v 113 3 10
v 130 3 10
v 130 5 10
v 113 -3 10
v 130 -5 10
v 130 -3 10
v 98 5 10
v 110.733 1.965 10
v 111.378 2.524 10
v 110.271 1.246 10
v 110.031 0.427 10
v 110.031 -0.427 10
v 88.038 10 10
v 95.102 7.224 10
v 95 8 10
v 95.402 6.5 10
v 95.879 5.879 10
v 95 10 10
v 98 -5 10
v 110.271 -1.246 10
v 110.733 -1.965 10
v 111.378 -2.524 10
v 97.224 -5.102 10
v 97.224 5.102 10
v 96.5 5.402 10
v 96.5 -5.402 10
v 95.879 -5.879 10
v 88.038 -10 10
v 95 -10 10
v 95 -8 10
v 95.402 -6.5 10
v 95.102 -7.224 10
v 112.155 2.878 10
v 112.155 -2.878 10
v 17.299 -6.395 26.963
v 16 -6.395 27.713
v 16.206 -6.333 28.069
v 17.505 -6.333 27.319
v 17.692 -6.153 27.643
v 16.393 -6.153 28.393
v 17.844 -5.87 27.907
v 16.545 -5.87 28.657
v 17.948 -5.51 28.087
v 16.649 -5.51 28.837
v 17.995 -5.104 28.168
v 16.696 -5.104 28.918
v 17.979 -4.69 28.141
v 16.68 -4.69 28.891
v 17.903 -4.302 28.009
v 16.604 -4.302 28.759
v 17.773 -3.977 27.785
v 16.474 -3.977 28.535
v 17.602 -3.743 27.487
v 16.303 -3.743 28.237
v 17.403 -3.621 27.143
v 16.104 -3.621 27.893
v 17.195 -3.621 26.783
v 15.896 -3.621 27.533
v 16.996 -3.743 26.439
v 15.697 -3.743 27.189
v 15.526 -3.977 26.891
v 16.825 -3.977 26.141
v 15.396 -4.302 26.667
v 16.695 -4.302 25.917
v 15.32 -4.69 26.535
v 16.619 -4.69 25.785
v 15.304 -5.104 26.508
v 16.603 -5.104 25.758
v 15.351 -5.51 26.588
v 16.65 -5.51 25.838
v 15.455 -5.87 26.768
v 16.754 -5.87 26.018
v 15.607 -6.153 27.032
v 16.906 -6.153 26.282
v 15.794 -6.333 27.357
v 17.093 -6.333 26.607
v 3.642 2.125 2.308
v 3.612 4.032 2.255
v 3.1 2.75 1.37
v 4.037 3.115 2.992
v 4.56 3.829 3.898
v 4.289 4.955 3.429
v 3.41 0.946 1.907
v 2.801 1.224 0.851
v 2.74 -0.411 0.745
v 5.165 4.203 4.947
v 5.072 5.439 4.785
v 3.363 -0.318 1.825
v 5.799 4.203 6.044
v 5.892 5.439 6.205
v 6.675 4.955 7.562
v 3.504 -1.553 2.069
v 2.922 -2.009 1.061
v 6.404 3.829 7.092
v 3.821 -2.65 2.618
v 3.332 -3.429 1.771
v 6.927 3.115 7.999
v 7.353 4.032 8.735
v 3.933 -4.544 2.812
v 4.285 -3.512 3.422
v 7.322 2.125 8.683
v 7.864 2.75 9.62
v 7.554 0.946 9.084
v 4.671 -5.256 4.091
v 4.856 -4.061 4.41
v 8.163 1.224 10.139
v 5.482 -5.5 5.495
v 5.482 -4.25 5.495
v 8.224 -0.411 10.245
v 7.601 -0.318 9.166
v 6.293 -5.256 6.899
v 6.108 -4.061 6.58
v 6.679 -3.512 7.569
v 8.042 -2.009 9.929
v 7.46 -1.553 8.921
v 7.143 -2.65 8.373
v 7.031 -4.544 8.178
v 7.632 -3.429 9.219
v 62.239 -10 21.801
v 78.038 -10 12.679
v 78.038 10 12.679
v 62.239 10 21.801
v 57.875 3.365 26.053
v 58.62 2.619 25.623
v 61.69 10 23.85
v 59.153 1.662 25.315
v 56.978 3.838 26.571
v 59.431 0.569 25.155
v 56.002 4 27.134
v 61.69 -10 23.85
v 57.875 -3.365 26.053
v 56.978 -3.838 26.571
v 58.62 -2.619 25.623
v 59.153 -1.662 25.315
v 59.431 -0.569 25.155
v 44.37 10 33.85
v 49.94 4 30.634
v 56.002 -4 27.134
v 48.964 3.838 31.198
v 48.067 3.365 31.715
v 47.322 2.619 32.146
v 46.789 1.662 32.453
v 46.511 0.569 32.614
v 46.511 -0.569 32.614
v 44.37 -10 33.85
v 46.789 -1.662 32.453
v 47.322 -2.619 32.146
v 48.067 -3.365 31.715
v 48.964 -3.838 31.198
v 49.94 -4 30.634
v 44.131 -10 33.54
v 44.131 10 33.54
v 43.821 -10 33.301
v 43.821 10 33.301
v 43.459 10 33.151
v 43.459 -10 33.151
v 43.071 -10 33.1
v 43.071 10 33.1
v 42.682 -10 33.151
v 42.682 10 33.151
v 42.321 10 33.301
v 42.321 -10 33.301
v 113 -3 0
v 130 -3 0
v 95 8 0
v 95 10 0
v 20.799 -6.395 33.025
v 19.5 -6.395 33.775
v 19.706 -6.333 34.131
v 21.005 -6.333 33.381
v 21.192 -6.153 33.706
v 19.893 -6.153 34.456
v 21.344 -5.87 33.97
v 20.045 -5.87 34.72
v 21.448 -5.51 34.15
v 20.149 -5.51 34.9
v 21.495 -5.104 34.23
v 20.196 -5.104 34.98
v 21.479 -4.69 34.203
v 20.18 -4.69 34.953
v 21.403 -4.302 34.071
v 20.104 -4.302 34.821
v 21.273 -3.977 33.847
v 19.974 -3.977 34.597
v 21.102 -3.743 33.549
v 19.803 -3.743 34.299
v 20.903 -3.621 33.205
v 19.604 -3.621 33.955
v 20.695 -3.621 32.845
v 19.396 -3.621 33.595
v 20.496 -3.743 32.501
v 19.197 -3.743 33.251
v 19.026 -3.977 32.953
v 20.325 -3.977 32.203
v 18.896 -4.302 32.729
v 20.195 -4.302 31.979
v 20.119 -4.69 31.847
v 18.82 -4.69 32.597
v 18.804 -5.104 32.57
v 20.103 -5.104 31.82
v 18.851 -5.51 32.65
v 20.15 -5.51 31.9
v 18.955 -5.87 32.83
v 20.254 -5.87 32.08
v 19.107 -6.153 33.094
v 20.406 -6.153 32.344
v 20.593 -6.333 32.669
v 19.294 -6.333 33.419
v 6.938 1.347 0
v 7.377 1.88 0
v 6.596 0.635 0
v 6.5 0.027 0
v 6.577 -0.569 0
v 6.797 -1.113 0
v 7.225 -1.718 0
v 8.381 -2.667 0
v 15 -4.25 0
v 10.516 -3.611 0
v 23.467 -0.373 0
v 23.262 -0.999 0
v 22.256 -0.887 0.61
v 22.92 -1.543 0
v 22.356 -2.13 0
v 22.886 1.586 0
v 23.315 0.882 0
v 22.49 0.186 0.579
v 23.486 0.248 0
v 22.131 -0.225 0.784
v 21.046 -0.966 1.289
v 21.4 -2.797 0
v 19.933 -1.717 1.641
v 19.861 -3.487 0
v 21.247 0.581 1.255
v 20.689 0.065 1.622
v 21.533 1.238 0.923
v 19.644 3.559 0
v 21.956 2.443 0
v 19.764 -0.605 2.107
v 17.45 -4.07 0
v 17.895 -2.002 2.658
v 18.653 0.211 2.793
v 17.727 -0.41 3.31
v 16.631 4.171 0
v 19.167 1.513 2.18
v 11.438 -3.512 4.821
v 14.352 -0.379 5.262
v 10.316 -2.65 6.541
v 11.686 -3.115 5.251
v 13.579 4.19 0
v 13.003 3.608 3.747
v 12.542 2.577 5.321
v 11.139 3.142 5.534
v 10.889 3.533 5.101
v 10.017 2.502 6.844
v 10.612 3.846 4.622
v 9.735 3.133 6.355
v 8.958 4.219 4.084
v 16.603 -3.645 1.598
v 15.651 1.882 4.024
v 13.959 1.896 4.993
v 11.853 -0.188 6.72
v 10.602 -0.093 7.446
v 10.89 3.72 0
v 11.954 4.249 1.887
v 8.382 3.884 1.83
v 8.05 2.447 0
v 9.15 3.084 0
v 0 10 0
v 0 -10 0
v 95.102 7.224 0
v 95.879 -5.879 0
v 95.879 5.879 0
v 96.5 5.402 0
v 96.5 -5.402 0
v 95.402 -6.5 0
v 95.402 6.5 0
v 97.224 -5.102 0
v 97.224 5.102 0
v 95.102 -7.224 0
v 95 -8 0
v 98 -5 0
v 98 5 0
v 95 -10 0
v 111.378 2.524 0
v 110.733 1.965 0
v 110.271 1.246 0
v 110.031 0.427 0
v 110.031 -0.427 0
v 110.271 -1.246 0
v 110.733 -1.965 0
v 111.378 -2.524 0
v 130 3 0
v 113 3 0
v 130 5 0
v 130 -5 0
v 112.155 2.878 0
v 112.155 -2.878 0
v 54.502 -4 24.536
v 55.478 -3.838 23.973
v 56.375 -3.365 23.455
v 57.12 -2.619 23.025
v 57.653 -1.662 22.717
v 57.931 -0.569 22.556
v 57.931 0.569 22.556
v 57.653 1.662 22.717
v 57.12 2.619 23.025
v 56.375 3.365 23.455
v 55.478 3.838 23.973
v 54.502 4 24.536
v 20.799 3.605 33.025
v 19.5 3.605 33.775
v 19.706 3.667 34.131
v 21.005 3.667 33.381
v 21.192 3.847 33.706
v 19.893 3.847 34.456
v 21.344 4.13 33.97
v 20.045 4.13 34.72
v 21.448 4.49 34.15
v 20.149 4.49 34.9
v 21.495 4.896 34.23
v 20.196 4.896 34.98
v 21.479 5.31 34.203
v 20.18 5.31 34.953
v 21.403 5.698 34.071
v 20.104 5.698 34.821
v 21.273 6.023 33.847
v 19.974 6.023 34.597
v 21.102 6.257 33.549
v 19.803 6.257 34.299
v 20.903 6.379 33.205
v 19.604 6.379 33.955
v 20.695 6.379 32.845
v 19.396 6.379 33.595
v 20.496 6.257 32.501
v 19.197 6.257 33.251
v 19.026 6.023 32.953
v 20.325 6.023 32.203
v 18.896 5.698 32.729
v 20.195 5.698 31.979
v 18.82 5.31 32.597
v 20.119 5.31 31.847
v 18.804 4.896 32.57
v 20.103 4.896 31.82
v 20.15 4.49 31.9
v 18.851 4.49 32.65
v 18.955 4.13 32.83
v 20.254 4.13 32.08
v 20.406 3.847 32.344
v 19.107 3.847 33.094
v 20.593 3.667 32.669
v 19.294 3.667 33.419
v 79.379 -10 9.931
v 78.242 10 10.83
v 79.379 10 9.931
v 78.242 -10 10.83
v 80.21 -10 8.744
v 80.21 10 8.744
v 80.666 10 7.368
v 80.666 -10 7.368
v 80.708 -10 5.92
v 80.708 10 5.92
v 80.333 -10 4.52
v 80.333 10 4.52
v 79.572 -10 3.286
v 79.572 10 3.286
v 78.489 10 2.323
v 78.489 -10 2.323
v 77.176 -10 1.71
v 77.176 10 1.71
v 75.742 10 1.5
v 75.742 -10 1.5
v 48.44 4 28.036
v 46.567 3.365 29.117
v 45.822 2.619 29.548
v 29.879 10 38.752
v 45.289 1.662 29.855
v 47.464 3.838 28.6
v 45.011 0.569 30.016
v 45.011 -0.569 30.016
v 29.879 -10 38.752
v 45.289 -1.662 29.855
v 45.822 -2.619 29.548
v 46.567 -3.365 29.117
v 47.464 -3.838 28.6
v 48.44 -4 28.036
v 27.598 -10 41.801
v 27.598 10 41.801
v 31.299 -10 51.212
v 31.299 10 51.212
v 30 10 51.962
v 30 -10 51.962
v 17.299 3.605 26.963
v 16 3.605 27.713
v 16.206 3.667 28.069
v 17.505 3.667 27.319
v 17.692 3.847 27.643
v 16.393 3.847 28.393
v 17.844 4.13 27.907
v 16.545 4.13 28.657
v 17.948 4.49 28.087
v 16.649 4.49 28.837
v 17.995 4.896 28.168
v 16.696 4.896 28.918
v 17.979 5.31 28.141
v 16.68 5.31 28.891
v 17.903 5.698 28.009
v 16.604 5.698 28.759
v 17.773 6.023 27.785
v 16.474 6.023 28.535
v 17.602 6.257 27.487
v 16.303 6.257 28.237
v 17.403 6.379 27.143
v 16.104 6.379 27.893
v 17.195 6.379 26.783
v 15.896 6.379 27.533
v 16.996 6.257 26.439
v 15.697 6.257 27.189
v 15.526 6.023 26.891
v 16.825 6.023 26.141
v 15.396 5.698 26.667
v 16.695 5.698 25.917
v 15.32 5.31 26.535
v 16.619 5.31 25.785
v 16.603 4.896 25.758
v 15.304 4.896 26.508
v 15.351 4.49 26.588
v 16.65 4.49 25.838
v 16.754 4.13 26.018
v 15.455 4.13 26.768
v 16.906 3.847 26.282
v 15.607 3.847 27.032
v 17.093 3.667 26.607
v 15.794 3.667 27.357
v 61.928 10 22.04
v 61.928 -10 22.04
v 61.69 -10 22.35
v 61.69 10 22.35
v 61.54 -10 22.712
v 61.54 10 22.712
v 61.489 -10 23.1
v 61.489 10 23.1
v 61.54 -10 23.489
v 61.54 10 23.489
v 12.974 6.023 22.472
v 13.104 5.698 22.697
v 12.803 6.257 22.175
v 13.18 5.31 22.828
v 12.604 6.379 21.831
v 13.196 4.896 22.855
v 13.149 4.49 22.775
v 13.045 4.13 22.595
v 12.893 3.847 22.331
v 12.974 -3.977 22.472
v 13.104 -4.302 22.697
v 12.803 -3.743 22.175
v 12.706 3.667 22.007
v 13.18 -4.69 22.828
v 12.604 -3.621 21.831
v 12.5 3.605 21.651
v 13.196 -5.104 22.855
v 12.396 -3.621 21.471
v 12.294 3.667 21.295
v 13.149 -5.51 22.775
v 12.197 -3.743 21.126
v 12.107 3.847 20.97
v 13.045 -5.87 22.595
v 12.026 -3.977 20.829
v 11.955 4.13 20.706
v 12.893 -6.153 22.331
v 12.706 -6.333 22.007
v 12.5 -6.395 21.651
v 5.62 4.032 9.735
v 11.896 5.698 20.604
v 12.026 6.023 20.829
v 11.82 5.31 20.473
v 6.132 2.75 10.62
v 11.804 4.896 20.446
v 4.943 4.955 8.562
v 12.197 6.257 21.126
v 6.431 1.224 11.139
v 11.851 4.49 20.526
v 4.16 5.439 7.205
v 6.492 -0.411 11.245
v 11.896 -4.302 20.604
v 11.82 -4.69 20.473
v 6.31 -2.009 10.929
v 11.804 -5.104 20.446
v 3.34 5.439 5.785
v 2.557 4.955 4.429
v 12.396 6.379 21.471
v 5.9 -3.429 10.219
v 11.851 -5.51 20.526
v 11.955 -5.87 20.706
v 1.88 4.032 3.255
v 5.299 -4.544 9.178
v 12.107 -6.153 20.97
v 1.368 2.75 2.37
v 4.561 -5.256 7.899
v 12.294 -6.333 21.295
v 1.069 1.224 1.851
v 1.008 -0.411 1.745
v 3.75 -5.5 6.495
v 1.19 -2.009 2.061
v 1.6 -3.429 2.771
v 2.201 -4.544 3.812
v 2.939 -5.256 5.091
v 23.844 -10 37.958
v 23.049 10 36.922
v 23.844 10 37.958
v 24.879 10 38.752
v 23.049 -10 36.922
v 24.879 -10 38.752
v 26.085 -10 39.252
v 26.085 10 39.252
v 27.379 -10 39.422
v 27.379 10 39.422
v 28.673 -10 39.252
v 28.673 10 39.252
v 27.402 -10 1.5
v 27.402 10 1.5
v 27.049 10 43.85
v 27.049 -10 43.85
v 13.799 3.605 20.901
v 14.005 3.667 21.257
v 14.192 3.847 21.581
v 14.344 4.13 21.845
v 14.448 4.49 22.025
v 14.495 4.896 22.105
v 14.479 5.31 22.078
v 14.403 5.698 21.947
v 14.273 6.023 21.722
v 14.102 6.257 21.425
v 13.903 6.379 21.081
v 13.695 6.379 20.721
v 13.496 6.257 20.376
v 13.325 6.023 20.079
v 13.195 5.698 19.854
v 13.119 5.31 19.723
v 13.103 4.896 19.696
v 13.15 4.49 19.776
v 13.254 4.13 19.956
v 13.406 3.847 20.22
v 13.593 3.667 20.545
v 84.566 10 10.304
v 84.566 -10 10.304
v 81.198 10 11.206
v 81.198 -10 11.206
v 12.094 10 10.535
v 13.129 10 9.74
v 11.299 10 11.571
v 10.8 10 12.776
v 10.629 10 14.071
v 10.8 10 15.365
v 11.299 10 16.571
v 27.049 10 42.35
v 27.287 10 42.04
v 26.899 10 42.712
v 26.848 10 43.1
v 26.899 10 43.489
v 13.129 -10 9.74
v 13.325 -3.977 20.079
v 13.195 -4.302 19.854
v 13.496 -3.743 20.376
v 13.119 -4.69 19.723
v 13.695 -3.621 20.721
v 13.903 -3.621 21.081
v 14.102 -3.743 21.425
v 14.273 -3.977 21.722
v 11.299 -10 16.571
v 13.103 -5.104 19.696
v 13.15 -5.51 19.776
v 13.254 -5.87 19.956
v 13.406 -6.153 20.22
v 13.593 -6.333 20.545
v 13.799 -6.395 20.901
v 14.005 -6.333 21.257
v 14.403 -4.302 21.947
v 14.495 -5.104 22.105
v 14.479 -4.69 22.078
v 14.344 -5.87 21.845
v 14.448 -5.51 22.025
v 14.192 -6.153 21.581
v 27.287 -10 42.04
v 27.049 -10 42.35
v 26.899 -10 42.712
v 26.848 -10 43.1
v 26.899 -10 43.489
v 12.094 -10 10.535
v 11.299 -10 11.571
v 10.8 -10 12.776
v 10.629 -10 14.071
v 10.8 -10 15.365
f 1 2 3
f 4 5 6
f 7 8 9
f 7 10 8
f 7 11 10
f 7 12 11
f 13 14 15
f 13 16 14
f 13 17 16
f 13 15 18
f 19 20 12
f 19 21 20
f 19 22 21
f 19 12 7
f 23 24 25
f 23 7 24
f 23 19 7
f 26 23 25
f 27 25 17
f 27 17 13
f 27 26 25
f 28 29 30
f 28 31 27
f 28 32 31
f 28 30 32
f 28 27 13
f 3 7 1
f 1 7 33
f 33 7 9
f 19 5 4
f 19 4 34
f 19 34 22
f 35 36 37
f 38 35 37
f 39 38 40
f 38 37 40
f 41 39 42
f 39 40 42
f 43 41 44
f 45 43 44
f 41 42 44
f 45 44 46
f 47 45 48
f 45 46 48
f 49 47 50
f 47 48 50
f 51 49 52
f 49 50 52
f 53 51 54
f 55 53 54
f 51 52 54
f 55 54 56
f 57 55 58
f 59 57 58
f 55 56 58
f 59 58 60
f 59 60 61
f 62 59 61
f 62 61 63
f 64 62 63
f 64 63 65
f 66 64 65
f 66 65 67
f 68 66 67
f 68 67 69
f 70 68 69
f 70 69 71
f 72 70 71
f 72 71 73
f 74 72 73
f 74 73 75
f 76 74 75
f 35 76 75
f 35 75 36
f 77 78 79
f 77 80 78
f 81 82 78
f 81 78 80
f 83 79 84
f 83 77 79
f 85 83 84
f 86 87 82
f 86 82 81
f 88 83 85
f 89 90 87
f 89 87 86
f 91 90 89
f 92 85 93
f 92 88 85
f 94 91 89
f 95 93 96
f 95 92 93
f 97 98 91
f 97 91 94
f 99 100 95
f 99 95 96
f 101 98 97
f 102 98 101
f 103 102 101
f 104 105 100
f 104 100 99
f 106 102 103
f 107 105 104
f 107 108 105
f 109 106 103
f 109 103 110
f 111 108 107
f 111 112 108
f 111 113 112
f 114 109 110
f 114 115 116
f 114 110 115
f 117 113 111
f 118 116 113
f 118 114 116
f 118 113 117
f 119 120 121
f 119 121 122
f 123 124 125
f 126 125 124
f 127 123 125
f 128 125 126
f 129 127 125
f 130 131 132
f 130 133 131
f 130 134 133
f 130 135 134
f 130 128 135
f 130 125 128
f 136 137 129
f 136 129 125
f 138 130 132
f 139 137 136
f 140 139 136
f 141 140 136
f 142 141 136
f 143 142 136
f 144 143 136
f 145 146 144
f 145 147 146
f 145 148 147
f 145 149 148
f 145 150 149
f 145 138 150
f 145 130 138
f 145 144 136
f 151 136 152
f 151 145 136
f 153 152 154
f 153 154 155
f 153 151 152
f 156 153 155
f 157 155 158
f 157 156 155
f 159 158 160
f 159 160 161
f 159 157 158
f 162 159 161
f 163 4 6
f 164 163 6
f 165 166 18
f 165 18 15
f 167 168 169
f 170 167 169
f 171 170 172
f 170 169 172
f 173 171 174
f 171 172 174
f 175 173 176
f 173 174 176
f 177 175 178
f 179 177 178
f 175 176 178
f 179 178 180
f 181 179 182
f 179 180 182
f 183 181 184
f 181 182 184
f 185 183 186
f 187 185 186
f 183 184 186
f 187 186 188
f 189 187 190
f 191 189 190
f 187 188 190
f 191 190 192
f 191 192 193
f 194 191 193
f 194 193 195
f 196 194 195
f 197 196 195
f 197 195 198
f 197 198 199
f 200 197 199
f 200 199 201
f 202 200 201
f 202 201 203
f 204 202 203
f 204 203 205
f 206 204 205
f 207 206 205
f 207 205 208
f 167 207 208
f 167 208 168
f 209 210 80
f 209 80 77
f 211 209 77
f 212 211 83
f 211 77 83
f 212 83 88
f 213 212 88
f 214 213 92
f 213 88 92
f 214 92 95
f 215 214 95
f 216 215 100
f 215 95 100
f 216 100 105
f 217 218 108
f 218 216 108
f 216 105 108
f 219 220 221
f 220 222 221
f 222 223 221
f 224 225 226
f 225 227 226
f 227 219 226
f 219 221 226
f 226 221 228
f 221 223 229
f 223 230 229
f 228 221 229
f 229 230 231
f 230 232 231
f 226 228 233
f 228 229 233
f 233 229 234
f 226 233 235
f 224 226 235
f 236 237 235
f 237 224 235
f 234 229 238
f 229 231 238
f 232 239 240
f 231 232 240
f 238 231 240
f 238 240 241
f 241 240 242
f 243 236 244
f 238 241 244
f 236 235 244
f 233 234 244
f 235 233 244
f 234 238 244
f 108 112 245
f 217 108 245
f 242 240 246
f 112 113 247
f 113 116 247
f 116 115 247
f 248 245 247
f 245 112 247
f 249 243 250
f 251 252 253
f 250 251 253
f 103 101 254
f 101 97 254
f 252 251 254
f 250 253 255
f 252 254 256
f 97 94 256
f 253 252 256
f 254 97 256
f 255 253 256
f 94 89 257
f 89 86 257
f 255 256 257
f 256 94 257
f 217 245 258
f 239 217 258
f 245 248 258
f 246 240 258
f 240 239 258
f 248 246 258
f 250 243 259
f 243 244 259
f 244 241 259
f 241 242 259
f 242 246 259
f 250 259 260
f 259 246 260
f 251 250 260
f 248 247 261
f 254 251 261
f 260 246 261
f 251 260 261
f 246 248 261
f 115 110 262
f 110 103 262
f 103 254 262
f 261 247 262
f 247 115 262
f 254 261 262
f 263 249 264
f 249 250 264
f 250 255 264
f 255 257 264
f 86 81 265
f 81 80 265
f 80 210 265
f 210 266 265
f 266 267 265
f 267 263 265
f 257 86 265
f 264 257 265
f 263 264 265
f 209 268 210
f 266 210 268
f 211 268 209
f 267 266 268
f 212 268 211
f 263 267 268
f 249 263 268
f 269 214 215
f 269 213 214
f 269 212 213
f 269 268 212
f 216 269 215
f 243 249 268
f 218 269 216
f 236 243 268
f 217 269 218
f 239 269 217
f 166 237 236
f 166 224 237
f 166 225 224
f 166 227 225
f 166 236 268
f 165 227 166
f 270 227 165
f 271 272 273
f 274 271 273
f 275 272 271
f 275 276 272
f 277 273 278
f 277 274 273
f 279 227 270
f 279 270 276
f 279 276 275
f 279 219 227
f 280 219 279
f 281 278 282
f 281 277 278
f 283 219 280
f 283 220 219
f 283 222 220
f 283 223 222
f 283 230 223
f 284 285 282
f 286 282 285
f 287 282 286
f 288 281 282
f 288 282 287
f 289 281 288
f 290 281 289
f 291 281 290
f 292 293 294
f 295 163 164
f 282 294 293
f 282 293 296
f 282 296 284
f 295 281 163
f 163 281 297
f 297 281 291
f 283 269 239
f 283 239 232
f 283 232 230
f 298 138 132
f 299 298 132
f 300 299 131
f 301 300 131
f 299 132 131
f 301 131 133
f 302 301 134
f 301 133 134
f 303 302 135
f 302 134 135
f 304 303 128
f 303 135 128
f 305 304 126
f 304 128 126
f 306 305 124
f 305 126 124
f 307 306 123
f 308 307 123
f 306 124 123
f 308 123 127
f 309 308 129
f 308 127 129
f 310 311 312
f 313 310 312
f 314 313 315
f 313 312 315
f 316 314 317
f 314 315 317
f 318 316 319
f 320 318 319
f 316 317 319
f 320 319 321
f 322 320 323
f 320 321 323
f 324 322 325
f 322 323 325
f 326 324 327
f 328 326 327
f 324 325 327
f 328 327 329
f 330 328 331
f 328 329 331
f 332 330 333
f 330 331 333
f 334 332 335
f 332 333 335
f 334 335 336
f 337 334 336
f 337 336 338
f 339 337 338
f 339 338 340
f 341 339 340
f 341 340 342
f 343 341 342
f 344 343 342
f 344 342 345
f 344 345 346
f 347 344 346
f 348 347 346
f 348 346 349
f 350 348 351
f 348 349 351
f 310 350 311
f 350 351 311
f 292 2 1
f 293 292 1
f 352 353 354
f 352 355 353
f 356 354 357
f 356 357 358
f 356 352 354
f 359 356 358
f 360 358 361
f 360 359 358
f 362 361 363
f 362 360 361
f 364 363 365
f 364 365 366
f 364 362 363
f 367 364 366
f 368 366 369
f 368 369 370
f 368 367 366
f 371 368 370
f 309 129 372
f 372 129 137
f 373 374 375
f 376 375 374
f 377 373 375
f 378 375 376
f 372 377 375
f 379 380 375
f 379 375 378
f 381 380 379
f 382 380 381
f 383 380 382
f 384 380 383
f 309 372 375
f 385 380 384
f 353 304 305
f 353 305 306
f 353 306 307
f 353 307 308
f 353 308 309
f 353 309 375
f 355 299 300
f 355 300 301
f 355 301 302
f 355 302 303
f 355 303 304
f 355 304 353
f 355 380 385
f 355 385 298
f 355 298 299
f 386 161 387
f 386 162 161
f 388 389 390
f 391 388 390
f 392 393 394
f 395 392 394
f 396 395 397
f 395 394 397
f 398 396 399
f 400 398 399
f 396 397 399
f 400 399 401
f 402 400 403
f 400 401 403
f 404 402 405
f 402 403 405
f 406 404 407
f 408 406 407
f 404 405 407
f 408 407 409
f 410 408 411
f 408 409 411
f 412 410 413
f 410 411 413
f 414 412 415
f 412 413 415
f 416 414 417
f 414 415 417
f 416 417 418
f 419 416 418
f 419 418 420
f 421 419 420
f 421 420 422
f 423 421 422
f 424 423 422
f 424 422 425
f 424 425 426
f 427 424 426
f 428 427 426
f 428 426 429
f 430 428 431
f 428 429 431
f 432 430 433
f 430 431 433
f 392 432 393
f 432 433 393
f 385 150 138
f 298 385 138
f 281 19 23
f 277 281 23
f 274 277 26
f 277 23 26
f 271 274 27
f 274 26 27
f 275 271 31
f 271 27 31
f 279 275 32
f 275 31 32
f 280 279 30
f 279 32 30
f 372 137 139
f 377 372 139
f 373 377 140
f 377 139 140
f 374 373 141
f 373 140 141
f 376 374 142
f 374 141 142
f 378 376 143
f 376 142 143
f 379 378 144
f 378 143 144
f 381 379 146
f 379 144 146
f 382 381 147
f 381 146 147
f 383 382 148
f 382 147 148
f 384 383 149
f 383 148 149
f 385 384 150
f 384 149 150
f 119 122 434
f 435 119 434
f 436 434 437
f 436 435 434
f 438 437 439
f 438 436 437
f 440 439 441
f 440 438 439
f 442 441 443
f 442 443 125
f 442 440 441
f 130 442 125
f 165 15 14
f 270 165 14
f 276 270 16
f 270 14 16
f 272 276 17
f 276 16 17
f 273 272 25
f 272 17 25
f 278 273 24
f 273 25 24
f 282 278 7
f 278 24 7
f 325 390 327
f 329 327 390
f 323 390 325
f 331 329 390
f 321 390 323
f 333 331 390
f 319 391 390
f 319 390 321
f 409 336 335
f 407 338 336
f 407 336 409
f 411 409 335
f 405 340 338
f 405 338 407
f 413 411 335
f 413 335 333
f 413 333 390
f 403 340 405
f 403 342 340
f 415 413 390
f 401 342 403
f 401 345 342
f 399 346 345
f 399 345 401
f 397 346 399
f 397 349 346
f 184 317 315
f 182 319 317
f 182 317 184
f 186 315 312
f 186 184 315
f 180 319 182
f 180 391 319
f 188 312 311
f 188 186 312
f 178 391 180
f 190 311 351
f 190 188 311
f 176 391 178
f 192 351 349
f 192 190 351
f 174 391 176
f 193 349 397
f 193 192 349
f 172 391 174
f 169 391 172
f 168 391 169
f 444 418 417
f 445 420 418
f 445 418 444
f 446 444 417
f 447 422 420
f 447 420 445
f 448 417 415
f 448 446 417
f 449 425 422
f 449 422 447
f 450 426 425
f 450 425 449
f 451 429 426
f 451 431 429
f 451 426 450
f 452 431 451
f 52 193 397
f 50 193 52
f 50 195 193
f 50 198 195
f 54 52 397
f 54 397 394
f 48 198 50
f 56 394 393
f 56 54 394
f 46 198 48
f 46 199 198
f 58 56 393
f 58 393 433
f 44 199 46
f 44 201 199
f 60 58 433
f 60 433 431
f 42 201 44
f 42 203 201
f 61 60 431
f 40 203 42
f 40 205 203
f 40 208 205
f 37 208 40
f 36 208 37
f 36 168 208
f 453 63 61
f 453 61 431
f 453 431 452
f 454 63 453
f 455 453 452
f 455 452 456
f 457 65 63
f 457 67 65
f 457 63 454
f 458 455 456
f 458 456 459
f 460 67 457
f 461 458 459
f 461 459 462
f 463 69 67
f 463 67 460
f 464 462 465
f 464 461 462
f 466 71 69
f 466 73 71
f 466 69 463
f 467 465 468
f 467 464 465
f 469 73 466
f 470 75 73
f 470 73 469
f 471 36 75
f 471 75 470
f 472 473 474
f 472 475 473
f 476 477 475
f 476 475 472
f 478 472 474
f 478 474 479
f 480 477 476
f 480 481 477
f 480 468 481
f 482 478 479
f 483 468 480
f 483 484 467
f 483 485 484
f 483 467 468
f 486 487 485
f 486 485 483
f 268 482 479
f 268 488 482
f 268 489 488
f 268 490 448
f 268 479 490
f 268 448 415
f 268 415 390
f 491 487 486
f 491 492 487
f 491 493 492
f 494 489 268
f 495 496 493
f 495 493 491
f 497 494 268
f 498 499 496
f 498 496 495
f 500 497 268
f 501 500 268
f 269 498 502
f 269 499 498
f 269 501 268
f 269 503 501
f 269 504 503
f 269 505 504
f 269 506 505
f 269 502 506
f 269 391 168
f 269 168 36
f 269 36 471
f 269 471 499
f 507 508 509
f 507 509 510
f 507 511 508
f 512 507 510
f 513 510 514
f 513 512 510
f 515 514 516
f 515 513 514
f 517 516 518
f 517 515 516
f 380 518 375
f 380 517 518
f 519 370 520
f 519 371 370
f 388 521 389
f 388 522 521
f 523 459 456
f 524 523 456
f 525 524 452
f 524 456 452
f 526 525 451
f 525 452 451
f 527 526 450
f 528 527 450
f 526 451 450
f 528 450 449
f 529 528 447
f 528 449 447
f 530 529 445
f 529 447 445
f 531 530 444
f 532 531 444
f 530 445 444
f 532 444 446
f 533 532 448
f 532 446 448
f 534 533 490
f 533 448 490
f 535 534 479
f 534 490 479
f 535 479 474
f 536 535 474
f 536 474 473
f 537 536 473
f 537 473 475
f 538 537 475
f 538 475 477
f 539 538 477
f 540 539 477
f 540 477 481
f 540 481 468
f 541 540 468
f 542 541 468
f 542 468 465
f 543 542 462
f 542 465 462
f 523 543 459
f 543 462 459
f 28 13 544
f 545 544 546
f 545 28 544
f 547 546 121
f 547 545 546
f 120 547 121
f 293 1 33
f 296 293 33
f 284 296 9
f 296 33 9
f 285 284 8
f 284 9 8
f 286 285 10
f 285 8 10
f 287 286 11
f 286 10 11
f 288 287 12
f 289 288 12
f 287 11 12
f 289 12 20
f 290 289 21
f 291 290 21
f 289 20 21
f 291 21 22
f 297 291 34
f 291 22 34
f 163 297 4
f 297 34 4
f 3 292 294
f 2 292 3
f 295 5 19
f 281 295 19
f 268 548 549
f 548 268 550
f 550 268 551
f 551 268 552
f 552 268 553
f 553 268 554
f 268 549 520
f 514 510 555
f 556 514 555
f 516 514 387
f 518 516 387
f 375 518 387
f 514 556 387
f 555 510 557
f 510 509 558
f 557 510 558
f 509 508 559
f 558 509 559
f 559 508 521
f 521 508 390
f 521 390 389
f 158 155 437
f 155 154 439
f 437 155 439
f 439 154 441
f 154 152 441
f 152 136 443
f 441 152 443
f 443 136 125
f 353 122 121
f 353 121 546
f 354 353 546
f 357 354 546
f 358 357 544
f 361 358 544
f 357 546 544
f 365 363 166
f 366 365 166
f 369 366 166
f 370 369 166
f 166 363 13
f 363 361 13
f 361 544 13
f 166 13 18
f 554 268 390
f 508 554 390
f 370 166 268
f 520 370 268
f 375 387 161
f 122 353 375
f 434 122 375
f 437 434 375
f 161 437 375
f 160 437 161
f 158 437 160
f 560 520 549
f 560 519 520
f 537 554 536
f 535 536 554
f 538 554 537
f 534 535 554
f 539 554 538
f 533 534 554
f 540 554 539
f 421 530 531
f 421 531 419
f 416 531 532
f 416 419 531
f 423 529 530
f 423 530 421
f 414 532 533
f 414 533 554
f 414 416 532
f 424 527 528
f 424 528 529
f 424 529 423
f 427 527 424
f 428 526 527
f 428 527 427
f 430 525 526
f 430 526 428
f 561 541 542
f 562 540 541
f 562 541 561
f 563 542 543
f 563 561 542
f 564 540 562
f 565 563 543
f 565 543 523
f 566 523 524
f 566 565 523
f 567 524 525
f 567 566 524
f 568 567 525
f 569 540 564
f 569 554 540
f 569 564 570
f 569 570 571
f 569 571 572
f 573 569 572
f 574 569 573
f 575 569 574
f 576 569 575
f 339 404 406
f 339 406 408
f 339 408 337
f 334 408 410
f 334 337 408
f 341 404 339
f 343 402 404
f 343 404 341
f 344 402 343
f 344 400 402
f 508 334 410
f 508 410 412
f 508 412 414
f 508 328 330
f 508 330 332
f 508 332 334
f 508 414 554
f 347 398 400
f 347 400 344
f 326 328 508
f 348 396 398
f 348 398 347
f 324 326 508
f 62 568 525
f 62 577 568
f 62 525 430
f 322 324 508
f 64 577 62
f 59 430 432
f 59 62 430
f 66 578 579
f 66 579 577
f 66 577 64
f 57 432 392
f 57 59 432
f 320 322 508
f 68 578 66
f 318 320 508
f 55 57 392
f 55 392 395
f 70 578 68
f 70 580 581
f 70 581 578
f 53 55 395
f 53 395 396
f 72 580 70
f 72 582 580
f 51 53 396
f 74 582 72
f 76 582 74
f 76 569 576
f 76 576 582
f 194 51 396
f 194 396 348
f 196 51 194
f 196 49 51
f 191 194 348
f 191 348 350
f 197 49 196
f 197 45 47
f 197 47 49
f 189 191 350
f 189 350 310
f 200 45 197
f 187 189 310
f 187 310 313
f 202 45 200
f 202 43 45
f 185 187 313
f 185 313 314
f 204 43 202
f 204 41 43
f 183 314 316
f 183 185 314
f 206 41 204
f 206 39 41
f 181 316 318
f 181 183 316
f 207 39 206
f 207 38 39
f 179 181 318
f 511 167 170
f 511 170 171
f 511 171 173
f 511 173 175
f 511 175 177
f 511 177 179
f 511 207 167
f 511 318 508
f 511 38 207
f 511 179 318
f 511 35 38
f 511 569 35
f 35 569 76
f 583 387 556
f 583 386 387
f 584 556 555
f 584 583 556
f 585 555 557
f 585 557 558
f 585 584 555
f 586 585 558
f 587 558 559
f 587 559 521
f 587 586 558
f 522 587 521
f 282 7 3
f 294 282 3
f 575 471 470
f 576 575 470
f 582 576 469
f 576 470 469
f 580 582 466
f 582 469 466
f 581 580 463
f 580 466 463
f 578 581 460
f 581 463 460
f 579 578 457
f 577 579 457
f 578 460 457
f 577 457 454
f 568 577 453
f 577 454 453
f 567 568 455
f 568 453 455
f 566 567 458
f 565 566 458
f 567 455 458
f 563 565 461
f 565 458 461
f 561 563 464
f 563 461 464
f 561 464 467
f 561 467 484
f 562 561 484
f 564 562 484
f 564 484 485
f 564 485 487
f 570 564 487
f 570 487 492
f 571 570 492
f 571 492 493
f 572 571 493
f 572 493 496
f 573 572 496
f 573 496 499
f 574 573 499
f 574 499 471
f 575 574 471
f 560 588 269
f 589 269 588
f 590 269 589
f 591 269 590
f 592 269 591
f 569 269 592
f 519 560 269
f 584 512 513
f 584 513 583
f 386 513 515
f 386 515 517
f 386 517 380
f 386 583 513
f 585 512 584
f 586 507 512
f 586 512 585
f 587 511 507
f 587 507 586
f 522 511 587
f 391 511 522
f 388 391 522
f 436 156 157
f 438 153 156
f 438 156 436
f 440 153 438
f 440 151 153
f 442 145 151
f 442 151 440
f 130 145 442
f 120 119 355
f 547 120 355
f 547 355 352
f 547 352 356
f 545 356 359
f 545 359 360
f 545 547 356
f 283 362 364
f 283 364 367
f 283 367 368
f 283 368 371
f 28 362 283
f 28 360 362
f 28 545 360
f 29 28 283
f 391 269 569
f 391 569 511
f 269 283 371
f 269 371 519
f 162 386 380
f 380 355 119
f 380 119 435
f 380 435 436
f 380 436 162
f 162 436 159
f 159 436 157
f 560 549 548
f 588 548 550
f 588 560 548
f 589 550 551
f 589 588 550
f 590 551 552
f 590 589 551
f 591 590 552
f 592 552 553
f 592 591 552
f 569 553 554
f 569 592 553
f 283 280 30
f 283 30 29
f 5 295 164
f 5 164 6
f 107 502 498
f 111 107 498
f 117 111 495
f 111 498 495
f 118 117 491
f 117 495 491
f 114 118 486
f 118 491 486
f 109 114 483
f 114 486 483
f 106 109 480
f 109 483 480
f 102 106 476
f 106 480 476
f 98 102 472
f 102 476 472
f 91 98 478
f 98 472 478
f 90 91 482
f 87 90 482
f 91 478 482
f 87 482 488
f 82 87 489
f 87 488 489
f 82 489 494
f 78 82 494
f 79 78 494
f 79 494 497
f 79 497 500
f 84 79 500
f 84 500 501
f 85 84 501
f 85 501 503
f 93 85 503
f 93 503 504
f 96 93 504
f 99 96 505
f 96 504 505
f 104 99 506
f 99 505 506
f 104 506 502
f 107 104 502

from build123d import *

# Parameters (mm, degrees)
F1_DEPTH  = 10
F3_DEPTH  = 10.001
F4_R      = 5.5
F4_R_2    = 4.25
F5_DEPTH  = 2
F6_DEPTH  = 112.584302492
F7_R      = 1.395
F8_DEPTH  = 1.5
F9_DEPTH  = 25
F11_DEPTH = 3


with BuildPart() as f1:
    # F0 (on Front) → F1 (new body, symmetric)
    with BuildSketch(Plane.XZ):
        with BuildLine():
            Line((30, 51.9615242271), (0, 0))
            Line((0, 0), (130, 0))
            Line((130, 0), (130, 10))
            Line((130, 10), (88.0384757729, 10))
            ThreePointArc((88.0384757729, 10), (82.8620948709, 10.6814834742), (78.0384757729, 12.6794919243))
            Line((78.0384757729, 12.6794919243), (62.2390923627, 21.8012701892))
            ThreePointArc((62.2390923627, 21.8012701892), (61.5402036233, 22.7120797272), (61.6900542571, 23.8503082949))
            Line((61.6900542571, 23.8503082949), (44.3695461814, 33.8503082949))
            ThreePointArc((44.3695461814, 33.8503082949), (43.4587366433, 33.1514195555), (42.3205080757, 33.3012701892))
            Line((42.3205080757, 33.3012701892), (27.5980762114, 41.8012701892))
            ThreePointArc((27.5980762114, 41.8012701892), (26.8991874719, 42.7120797272), (27.0490381057, 43.8503082949))
            Line((27.0490381057, 43.8503082949), (31.2990381057, 51.2115242271))
            Line((31.2990381057, 51.2115242271), (30, 51.9615242271))
        make_face()
        with BuildLine():
            Line((11.2990381057, 16.5705080757), (23.0490381057, 36.9221050646))
            ThreePointArc((23.0490381057, 36.9221050646), (26.0850698991, 39.2517341961), (29.8791651246, 38.7522320835))
            Line((29.8791651246, 38.7522320835), (78.2416697508, 10.8301270189))
            ThreePointArc((78.2416697508, 10.8301270189), (80.5712988822, 5.2059047745), (75.7416697508, 1.5))
            Line((75.7416697508, 1.5), (27.4019237886, 1.5))
            Line((27.4019237886, 1.5), (13.1291651246, 9.7403810568))
            ThreePointArc((13.1291651246, 9.7403810568), (10.7995359932, 12.7764128502), (11.2990381057, 16.5705080757))
        make_face(mode=Mode.SUBTRACT)
    extrude(amount=F1_DEPTH, both=True)

    # F2 (on face) → F3 (cut, through all)
    with BuildSketch(Plane.XY.offset(10)):
        with BuildLine():
            Line((130, -10), (130, -5))
            Line((130, -5), (98, -5))
            ThreePointArc((98, -5), (95.8786796564, -5.8786796564), (95, -8))
            Line((95, -8), (95, -10))
            Line((95, -10), (130, -10))
        make_face()
        with BuildLine():
            Line((130, -3), (130, 3))
            Line((130, 3), (113, 3))
            ThreePointArc((113, 3), (110, 0), (113, -3))
            Line((113, -3), (130, -3))
        make_face()
        with BuildLine():
            Line((98, 5), (130, 5))
            Line((130, 5), (130, 10))
            Line((130, 10), (95, 10))
            Line((95, 10), (95, 8))
            ThreePointArc((95, 8), (95.8786796564, 5.8786796564), (98, 5))
        make_face()
    extrude(amount=-F3_DEPTH, mode=Mode.SUBTRACT)

    # F4 (on face) → F5 (cut)
    with BuildSketch(Plane(origin=(0, 0, 0), x_dir=(0, -1, 0), z_dir=(-0.8660254038, 0, 0.5))):
        with Locations((0, 7.5)):
            Circle(F4_R)
        with Locations((0, 7.5)):
            Circle(F4_R_2, mode=Mode.SUBTRACT)
    extrude(amount=-F5_DEPTH, mode=Mode.SUBTRACT)

    # F6 (cut, through all): a face of the model
    f6_faces = [f1.faces().sort_by_distance(p)[0] for p in [
        (3.75, 0, 6.4951905284),
    ]]
    extrude(f6_faces, amount=-F6_DEPTH, mode=Mode.SUBTRACT)

    # F7 (on face) → F8 (cut, through all)
    with BuildSketch(Plane(origin=(0, 0, 0), x_dir=(0, -1, 0), z_dir=(-0.8660254038, 0, 0.5))):
        with Locations((-5, 32)):
            Circle(F7_R)
        with Locations((-5, 25)):
            Circle(F7_R)
        with Locations((-5, 39)):
            Circle(F7_R)
    extrude(amount=-F8_DEPTH, mode=Mode.SUBTRACT)

    # F7 (on face) → F9 (cut)
    with BuildSketch(Plane(origin=(0, 0, 0), x_dir=(0, -1, 0), z_dir=(-0.8660254038, 0, 0.5))):
        with Locations((-5, 25)):
            Circle(F7_R)
        with Locations((-5, 32)):
            Circle(F7_R)
        with Locations((-5, 39)):
            Circle(F7_R)
        with Locations((5, 39)):
            Circle(F7_R)
        with Locations((5, 32)):
            Circle(F7_R)
        with Locations((5, 25)):
            Circle(F7_R)
    extrude(amount=-F9_DEPTH, mode=Mode.SUBTRACT)

    # F10 (on face) → F11 (cut, through all)
    with BuildSketch(Plane(origin=(25.75, 0, 44.6003082949), x_dir=(0.8660254038, 0, -0.5), z_dir=(0.5, 0, 0.8660254038))):
        with BuildLine():
            ThreePointArc((27.9322247952, 4), (23.9322247952, 0), (27.9322247952, -4))
            Line((27.9322247952, -4), (34.9322247952, -4))
            ThreePointArc((34.9322247952, -4), (38.9322247952, 0), (34.9322247952, 4))
            Line((34.9322247952, 4), (27.9322247952, 4))
        make_face()
    extrude(amount=-F11_DEPTH, mode=Mode.SUBTRACT)


solid = f1.part
